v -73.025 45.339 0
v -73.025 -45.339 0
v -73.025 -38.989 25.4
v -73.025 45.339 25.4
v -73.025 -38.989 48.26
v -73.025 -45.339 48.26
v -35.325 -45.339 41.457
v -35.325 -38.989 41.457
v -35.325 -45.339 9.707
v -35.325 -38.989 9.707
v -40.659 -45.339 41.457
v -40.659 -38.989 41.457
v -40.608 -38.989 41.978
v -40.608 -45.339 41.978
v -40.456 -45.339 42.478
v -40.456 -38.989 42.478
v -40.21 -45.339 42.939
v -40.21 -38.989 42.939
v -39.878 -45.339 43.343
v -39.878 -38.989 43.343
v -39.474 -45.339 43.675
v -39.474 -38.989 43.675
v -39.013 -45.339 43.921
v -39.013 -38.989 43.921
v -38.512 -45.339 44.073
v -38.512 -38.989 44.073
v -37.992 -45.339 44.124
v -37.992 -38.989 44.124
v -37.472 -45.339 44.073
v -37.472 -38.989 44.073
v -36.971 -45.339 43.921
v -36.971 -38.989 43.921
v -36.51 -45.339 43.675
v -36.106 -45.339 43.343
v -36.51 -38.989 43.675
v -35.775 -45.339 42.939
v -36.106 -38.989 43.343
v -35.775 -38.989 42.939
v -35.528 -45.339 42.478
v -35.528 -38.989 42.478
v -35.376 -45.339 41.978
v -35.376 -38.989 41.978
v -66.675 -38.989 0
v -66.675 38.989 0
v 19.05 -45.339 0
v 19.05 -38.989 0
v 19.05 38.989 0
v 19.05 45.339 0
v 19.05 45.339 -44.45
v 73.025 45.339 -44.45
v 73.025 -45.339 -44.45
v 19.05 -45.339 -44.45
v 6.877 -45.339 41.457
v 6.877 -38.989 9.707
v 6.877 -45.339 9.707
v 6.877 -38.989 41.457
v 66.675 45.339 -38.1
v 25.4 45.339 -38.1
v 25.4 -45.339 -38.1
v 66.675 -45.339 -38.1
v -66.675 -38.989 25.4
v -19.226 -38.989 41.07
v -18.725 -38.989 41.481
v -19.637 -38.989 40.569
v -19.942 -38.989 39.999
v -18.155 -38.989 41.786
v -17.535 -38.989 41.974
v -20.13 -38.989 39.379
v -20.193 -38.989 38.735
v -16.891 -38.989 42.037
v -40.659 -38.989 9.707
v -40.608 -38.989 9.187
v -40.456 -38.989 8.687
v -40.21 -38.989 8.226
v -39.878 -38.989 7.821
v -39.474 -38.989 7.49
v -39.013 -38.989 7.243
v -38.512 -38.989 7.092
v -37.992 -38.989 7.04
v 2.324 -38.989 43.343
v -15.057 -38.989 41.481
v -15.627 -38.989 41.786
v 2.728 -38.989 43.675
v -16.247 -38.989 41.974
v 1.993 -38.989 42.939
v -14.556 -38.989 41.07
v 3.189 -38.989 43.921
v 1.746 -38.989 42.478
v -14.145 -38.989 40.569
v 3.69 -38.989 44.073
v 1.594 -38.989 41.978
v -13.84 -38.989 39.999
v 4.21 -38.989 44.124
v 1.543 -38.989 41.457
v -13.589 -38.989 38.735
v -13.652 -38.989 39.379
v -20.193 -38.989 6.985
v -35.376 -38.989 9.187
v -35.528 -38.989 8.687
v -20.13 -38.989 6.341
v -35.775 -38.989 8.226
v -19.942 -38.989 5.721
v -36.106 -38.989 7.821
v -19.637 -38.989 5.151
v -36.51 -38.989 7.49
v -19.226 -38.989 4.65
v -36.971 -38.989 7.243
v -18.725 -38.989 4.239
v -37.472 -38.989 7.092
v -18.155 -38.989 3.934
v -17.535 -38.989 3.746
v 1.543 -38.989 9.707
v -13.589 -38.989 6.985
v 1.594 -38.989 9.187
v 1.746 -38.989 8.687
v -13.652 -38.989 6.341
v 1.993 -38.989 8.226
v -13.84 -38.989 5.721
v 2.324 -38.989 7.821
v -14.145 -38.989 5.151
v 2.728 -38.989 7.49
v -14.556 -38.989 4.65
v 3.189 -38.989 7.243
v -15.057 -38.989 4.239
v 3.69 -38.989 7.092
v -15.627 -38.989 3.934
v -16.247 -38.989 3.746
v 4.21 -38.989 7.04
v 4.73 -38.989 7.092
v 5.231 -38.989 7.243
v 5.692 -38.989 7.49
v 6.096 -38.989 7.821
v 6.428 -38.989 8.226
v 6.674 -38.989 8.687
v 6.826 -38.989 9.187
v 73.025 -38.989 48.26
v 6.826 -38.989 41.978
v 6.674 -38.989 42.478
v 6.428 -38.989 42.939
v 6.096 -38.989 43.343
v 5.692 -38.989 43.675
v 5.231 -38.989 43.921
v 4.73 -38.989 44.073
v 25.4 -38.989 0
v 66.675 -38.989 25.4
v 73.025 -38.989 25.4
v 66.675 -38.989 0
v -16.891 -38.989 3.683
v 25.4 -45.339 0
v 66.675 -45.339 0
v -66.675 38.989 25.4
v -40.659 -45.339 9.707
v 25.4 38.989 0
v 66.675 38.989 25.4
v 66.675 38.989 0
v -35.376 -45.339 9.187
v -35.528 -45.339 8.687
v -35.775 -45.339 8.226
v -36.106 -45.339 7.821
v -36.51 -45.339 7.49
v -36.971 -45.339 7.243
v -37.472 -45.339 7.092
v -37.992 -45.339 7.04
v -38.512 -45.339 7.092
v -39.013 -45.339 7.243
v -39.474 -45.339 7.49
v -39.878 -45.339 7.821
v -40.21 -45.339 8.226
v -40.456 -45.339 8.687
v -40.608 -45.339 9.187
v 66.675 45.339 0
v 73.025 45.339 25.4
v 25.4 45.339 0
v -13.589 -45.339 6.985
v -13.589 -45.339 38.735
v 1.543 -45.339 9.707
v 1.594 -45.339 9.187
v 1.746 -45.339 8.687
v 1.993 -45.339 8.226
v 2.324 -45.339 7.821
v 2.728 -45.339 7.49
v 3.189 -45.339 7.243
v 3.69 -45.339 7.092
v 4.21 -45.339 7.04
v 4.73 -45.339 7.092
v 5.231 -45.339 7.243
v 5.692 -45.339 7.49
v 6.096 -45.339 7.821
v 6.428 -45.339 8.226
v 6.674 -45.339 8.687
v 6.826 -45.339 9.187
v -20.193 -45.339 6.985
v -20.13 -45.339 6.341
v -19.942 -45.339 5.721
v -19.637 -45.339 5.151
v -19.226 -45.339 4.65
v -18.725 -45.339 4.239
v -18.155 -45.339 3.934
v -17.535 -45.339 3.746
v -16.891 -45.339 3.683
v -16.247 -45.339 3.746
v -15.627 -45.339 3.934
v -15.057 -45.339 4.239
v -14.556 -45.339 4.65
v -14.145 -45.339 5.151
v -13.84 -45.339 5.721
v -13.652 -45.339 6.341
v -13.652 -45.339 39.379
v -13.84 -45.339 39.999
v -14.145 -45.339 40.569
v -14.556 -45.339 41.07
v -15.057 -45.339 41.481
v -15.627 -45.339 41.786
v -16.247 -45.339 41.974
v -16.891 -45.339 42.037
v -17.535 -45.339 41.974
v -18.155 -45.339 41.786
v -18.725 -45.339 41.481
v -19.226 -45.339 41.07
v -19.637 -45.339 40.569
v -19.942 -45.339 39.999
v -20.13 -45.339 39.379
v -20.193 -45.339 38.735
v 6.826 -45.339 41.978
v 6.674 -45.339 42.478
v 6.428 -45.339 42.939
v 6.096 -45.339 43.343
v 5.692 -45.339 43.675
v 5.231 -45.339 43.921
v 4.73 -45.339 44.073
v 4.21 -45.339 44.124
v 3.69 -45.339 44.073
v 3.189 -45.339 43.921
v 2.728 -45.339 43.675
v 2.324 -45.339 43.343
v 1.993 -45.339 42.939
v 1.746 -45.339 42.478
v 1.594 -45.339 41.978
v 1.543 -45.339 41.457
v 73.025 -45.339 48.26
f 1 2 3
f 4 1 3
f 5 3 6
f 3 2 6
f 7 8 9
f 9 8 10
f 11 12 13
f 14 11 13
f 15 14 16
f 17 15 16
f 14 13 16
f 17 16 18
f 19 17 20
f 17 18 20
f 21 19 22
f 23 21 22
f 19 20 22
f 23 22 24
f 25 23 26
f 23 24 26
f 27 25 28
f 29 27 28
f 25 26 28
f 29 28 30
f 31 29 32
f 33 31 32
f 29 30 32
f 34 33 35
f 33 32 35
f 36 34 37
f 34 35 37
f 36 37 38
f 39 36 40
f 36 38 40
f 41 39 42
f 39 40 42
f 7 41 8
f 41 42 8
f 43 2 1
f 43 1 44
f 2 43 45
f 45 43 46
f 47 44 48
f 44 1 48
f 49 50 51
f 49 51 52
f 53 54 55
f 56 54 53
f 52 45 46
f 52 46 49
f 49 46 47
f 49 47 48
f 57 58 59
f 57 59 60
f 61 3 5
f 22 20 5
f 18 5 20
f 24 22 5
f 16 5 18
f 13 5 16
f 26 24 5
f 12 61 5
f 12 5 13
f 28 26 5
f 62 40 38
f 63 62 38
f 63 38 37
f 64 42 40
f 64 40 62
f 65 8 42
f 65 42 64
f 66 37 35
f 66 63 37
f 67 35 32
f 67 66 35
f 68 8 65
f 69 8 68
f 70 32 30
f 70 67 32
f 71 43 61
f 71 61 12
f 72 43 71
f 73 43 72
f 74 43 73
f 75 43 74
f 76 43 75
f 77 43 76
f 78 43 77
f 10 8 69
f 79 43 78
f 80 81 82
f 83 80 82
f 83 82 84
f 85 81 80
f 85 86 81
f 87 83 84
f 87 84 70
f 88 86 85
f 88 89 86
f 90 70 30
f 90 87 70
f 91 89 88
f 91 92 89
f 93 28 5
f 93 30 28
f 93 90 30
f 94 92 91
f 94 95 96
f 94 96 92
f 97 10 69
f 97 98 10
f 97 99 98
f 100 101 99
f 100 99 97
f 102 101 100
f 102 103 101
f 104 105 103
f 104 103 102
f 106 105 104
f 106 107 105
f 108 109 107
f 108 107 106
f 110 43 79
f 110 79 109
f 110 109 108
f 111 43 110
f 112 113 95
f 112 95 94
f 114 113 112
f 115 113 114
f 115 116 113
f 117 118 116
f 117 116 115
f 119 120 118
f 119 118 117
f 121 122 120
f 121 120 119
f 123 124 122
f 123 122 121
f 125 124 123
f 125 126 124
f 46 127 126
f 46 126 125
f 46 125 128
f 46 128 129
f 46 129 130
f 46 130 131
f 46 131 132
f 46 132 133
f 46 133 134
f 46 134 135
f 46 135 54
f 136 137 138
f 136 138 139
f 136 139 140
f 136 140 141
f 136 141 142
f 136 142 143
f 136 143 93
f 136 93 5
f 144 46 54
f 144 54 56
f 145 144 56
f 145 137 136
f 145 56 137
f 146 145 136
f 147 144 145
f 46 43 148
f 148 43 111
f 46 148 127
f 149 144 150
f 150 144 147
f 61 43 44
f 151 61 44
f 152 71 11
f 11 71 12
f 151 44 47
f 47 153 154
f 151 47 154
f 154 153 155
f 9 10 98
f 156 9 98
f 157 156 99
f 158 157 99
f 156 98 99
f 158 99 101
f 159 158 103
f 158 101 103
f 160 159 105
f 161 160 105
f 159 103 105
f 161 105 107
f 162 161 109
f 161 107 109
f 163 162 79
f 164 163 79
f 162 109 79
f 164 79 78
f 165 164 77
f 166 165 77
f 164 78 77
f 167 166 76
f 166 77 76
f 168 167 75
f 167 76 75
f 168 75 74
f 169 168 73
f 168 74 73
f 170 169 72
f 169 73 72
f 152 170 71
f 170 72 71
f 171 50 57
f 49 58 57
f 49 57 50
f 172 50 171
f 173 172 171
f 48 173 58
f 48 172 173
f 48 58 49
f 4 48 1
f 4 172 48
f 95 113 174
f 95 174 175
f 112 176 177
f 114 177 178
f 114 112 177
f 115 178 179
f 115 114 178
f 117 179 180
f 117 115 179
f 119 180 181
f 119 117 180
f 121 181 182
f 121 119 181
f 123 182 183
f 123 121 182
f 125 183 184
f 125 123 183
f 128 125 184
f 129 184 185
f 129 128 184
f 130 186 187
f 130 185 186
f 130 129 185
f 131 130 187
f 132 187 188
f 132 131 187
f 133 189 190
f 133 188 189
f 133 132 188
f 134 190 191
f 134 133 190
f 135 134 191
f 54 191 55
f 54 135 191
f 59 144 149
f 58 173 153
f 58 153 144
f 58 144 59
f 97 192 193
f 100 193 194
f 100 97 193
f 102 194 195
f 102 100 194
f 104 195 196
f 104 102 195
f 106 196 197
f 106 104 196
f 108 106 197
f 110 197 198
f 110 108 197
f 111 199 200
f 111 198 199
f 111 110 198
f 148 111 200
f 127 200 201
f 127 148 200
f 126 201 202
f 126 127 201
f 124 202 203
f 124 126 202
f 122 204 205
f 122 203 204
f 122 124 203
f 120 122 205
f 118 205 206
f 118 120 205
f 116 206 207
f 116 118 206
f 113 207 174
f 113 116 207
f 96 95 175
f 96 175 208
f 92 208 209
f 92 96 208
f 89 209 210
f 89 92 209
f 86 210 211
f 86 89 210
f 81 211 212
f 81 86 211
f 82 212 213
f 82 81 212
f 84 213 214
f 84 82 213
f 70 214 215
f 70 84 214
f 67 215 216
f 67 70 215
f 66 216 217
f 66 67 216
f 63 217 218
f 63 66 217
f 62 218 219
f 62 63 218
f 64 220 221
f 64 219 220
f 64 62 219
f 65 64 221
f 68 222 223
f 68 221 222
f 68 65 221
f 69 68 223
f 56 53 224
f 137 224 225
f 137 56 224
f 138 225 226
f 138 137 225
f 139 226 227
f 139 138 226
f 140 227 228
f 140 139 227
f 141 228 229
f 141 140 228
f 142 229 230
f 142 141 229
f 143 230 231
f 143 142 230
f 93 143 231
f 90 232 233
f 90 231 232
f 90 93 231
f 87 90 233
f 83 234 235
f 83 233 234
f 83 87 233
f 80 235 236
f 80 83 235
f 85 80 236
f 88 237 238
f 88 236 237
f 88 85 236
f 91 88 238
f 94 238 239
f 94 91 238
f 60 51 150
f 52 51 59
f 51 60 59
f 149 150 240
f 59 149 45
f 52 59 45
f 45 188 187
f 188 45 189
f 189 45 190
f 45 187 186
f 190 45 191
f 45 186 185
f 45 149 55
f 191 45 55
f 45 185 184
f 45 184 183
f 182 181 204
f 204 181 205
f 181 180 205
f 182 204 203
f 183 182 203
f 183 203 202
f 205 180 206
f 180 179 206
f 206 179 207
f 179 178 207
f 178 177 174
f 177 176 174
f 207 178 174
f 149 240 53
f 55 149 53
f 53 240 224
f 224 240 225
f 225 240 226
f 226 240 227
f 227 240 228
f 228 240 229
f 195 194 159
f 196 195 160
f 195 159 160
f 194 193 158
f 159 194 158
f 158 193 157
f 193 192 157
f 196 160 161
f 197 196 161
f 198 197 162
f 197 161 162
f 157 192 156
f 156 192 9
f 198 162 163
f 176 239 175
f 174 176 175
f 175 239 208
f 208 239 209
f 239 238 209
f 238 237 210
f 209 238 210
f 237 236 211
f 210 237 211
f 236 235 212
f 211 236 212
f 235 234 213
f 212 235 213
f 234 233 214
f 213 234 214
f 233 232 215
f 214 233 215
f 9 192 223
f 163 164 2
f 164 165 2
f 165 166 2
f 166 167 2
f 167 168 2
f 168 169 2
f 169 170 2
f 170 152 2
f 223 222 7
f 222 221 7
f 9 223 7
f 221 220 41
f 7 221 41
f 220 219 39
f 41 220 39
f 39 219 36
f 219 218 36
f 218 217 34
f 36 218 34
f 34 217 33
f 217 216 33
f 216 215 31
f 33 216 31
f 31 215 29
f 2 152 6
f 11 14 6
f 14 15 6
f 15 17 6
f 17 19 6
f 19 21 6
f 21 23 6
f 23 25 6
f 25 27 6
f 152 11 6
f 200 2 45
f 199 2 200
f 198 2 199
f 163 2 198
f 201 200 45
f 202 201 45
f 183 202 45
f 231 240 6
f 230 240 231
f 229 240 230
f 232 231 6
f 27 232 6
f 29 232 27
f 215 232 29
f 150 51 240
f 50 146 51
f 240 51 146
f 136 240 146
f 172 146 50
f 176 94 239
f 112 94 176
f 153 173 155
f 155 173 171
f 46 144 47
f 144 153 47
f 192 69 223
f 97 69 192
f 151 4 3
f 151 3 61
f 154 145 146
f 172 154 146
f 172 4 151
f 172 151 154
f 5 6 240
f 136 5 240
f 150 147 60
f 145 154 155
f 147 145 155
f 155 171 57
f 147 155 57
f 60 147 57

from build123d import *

# Parameters (mm, degrees)
SKETCH1_W           = 146.05
SKETCH1_H           = 90.678
SKETCH1_W_2         = 133.35
SKETCH1_H_2         = 77.978
BOSS_EXTRUDE1_DEPTH = 25.4
SKETCH2_W           = 60.325
SKETCH2_H           = 22.86
BOSS_EXTRUDE2_DEPTH = 6.35
CUT_EXTRUDE1_REACH  = 123.544
SKETCH6_W           = 53.975
SKETCH6_H           = 90.678
BOSS_EXTRUDE3_DEPTH = 44.45
CUT_EXTRUDE3_REACH  = 128.032
SKETCH8_W           = 41.275
SKETCH8_H           = 38.1


with BuildPart() as part:
    # Sketch1 → Boss-Extrude1 (new body)
    with BuildSketch(Plane.XY):
        Rectangle(SKETCH1_W, SKETCH1_H)
        Rectangle(SKETCH1_W_2, SKETCH1_H_2, mode=Mode.SUBTRACT)
    extrude(amount=BOSS_EXTRUDE1_DEPTH)

    # Sketch2 → Boss-Extrude2 (add)
    with BuildSketch(Plane(origin=(0, -45.339, 0), x_dir=(1, 0, 0), z_dir=(0, 1, 0))):
        Polygon((-40.513, -48.26), (-40.513, -25.4), (-73.025, -25.4), align=None)
        with Locations((-10.3505, -36.83)):
            Rectangle(SKETCH2_W, SKETCH2_H)
        Polygon((73.025, -25.4), (19.812, -25.4), (19.812, -48.26), align=None)
        Polygon((-73.025, -48.26), (-40.513, -48.26), (-73.025, -25.4), align=None)
        Polygon((73.025, -25.4), (19.812, -48.26), (73.025, -48.26), align=None)
    extrude(amount=BOSS_EXTRUDE2_DEPTH)

    # Sketch5 → Cut-Extrude1 (cut, up to next)
    with BuildSketch(Plane(origin=(0, -38.989, 0), x_dir=(1, 0, 0), z_dir=(0, 1, 0)), mode=Mode.PRIVATE) as cut_extrude1_sk1:
        with BuildLine():
            Line((-20.193, -38.735), (-20.193, -6.985))
            ThreePointArc((-20.193, -6.985), (-16.891, -3.683), (-13.589, -6.985))
            Line((-13.589, -6.985), (-13.589, -38.735))
            ThreePointArc((-13.589, -38.735), (-16.891, -42.037), (-20.193, -38.735))
        make_face()
    cut_extrude1_tool1 = extrude(cut_extrude1_sk1.sketch, amount=-CUT_EXTRUDE1_REACH, mode=Mode.PRIVATE) & part.part
    # Sketch5 → Cut-Extrude1 (cut, up to next)
    with BuildSketch(Plane(origin=(0, -38.989, 0), x_dir=(1, 0, 0), z_dir=(0, 1, 0)), mode=Mode.PRIVATE) as cut_extrude1_sk2:
        with BuildLine():
            Line((6.87705, -9.707286463), (6.87705, -41.457286463))
            ThreePointArc((6.87705, -41.457286463), (4.21005, -44.124286463), (1.54305, -41.457286463))
            Line((1.54305, -41.457286463), (1.54305, -9.707286463))
            ThreePointArc((1.54305, -9.707286463), (4.21005, -7.040286463), (6.87705, -9.707286463))
        make_face()
    cut_extrude1_tool2 = extrude(cut_extrude1_sk2.sketch, amount=-CUT_EXTRUDE1_REACH, mode=Mode.PRIVATE) & part.part
    # Sketch5 → Cut-Extrude1 (cut, up to next)
    with BuildSketch(Plane(origin=(0, -38.989, 0), x_dir=(1, 0, 0), z_dir=(0, 1, 0)), mode=Mode.PRIVATE) as cut_extrude1_sk3:
        with BuildLine():
            Line((-40.65905, -9.707286463), (-40.65905, -41.457286463))
            ThreePointArc((-40.65905, -41.457286463), (-37.99205, -44.124286463), (-35.32505, -41.457286463))
            Line((-35.32505, -41.457286463), (-35.32505, -9.707286463))
            ThreePointArc((-35.32505, -9.707286463), (-37.99205, -7.040286463), (-40.65905, -9.707286463))
        make_face()
    cut_extrude1_tool3 = extrude(cut_extrude1_sk3.sketch, amount=-CUT_EXTRUDE1_REACH, mode=Mode.PRIVATE) & part.part
    add(cut_extrude1_tool1.solids().sort_by_distance((-16.891, -38.989, 22.86))[0], mode=Mode.SUBTRACT)
    add(cut_extrude1_tool2.solids().sort_by_distance((4.21005, -38.989, 25.582286))[0], mode=Mode.SUBTRACT)
    add(cut_extrude1_tool3.solids().sort_by_distance((-37.99205, -38.989, 25.582286))[0], mode=Mode.SUBTRACT)

    # Sketch6 → Boss-Extrude3 (add)
    with BuildSketch(Plane(origin=(0, 0, 0), x_dir=(-1, 0, 0), z_dir=(0, 0, -1))):
        with Locations((-46.0375, 0)):
            Rectangle(SKETCH6_W, SKETCH6_H)
    extrude(amount=BOSS_EXTRUDE3_DEPTH)

    # Sketch8 → Cut-Extrude3 (cut, up to next)
    with BuildSketch(Plane(origin=(0, 45.339, 0), x_dir=(1, 0, 0), z_dir=(0, 1, 0)), mode=Mode.PRIVATE) as cut_extrude3_sk1:
        with Locations((46.0375, 19.05)):
            Rectangle(SKETCH8_W, SKETCH8_H)
    cut_extrude3_tool1 = extrude(cut_extrude3_sk1.sketch, amount=-CUT_EXTRUDE3_REACH, mode=Mode.PRIVATE) & part.part
    add(cut_extrude3_tool1.solids().sort_by_distance((46.0375, 45.339, -19.05))[0], mode=Mode.SUBTRACT)


solid = part.part
